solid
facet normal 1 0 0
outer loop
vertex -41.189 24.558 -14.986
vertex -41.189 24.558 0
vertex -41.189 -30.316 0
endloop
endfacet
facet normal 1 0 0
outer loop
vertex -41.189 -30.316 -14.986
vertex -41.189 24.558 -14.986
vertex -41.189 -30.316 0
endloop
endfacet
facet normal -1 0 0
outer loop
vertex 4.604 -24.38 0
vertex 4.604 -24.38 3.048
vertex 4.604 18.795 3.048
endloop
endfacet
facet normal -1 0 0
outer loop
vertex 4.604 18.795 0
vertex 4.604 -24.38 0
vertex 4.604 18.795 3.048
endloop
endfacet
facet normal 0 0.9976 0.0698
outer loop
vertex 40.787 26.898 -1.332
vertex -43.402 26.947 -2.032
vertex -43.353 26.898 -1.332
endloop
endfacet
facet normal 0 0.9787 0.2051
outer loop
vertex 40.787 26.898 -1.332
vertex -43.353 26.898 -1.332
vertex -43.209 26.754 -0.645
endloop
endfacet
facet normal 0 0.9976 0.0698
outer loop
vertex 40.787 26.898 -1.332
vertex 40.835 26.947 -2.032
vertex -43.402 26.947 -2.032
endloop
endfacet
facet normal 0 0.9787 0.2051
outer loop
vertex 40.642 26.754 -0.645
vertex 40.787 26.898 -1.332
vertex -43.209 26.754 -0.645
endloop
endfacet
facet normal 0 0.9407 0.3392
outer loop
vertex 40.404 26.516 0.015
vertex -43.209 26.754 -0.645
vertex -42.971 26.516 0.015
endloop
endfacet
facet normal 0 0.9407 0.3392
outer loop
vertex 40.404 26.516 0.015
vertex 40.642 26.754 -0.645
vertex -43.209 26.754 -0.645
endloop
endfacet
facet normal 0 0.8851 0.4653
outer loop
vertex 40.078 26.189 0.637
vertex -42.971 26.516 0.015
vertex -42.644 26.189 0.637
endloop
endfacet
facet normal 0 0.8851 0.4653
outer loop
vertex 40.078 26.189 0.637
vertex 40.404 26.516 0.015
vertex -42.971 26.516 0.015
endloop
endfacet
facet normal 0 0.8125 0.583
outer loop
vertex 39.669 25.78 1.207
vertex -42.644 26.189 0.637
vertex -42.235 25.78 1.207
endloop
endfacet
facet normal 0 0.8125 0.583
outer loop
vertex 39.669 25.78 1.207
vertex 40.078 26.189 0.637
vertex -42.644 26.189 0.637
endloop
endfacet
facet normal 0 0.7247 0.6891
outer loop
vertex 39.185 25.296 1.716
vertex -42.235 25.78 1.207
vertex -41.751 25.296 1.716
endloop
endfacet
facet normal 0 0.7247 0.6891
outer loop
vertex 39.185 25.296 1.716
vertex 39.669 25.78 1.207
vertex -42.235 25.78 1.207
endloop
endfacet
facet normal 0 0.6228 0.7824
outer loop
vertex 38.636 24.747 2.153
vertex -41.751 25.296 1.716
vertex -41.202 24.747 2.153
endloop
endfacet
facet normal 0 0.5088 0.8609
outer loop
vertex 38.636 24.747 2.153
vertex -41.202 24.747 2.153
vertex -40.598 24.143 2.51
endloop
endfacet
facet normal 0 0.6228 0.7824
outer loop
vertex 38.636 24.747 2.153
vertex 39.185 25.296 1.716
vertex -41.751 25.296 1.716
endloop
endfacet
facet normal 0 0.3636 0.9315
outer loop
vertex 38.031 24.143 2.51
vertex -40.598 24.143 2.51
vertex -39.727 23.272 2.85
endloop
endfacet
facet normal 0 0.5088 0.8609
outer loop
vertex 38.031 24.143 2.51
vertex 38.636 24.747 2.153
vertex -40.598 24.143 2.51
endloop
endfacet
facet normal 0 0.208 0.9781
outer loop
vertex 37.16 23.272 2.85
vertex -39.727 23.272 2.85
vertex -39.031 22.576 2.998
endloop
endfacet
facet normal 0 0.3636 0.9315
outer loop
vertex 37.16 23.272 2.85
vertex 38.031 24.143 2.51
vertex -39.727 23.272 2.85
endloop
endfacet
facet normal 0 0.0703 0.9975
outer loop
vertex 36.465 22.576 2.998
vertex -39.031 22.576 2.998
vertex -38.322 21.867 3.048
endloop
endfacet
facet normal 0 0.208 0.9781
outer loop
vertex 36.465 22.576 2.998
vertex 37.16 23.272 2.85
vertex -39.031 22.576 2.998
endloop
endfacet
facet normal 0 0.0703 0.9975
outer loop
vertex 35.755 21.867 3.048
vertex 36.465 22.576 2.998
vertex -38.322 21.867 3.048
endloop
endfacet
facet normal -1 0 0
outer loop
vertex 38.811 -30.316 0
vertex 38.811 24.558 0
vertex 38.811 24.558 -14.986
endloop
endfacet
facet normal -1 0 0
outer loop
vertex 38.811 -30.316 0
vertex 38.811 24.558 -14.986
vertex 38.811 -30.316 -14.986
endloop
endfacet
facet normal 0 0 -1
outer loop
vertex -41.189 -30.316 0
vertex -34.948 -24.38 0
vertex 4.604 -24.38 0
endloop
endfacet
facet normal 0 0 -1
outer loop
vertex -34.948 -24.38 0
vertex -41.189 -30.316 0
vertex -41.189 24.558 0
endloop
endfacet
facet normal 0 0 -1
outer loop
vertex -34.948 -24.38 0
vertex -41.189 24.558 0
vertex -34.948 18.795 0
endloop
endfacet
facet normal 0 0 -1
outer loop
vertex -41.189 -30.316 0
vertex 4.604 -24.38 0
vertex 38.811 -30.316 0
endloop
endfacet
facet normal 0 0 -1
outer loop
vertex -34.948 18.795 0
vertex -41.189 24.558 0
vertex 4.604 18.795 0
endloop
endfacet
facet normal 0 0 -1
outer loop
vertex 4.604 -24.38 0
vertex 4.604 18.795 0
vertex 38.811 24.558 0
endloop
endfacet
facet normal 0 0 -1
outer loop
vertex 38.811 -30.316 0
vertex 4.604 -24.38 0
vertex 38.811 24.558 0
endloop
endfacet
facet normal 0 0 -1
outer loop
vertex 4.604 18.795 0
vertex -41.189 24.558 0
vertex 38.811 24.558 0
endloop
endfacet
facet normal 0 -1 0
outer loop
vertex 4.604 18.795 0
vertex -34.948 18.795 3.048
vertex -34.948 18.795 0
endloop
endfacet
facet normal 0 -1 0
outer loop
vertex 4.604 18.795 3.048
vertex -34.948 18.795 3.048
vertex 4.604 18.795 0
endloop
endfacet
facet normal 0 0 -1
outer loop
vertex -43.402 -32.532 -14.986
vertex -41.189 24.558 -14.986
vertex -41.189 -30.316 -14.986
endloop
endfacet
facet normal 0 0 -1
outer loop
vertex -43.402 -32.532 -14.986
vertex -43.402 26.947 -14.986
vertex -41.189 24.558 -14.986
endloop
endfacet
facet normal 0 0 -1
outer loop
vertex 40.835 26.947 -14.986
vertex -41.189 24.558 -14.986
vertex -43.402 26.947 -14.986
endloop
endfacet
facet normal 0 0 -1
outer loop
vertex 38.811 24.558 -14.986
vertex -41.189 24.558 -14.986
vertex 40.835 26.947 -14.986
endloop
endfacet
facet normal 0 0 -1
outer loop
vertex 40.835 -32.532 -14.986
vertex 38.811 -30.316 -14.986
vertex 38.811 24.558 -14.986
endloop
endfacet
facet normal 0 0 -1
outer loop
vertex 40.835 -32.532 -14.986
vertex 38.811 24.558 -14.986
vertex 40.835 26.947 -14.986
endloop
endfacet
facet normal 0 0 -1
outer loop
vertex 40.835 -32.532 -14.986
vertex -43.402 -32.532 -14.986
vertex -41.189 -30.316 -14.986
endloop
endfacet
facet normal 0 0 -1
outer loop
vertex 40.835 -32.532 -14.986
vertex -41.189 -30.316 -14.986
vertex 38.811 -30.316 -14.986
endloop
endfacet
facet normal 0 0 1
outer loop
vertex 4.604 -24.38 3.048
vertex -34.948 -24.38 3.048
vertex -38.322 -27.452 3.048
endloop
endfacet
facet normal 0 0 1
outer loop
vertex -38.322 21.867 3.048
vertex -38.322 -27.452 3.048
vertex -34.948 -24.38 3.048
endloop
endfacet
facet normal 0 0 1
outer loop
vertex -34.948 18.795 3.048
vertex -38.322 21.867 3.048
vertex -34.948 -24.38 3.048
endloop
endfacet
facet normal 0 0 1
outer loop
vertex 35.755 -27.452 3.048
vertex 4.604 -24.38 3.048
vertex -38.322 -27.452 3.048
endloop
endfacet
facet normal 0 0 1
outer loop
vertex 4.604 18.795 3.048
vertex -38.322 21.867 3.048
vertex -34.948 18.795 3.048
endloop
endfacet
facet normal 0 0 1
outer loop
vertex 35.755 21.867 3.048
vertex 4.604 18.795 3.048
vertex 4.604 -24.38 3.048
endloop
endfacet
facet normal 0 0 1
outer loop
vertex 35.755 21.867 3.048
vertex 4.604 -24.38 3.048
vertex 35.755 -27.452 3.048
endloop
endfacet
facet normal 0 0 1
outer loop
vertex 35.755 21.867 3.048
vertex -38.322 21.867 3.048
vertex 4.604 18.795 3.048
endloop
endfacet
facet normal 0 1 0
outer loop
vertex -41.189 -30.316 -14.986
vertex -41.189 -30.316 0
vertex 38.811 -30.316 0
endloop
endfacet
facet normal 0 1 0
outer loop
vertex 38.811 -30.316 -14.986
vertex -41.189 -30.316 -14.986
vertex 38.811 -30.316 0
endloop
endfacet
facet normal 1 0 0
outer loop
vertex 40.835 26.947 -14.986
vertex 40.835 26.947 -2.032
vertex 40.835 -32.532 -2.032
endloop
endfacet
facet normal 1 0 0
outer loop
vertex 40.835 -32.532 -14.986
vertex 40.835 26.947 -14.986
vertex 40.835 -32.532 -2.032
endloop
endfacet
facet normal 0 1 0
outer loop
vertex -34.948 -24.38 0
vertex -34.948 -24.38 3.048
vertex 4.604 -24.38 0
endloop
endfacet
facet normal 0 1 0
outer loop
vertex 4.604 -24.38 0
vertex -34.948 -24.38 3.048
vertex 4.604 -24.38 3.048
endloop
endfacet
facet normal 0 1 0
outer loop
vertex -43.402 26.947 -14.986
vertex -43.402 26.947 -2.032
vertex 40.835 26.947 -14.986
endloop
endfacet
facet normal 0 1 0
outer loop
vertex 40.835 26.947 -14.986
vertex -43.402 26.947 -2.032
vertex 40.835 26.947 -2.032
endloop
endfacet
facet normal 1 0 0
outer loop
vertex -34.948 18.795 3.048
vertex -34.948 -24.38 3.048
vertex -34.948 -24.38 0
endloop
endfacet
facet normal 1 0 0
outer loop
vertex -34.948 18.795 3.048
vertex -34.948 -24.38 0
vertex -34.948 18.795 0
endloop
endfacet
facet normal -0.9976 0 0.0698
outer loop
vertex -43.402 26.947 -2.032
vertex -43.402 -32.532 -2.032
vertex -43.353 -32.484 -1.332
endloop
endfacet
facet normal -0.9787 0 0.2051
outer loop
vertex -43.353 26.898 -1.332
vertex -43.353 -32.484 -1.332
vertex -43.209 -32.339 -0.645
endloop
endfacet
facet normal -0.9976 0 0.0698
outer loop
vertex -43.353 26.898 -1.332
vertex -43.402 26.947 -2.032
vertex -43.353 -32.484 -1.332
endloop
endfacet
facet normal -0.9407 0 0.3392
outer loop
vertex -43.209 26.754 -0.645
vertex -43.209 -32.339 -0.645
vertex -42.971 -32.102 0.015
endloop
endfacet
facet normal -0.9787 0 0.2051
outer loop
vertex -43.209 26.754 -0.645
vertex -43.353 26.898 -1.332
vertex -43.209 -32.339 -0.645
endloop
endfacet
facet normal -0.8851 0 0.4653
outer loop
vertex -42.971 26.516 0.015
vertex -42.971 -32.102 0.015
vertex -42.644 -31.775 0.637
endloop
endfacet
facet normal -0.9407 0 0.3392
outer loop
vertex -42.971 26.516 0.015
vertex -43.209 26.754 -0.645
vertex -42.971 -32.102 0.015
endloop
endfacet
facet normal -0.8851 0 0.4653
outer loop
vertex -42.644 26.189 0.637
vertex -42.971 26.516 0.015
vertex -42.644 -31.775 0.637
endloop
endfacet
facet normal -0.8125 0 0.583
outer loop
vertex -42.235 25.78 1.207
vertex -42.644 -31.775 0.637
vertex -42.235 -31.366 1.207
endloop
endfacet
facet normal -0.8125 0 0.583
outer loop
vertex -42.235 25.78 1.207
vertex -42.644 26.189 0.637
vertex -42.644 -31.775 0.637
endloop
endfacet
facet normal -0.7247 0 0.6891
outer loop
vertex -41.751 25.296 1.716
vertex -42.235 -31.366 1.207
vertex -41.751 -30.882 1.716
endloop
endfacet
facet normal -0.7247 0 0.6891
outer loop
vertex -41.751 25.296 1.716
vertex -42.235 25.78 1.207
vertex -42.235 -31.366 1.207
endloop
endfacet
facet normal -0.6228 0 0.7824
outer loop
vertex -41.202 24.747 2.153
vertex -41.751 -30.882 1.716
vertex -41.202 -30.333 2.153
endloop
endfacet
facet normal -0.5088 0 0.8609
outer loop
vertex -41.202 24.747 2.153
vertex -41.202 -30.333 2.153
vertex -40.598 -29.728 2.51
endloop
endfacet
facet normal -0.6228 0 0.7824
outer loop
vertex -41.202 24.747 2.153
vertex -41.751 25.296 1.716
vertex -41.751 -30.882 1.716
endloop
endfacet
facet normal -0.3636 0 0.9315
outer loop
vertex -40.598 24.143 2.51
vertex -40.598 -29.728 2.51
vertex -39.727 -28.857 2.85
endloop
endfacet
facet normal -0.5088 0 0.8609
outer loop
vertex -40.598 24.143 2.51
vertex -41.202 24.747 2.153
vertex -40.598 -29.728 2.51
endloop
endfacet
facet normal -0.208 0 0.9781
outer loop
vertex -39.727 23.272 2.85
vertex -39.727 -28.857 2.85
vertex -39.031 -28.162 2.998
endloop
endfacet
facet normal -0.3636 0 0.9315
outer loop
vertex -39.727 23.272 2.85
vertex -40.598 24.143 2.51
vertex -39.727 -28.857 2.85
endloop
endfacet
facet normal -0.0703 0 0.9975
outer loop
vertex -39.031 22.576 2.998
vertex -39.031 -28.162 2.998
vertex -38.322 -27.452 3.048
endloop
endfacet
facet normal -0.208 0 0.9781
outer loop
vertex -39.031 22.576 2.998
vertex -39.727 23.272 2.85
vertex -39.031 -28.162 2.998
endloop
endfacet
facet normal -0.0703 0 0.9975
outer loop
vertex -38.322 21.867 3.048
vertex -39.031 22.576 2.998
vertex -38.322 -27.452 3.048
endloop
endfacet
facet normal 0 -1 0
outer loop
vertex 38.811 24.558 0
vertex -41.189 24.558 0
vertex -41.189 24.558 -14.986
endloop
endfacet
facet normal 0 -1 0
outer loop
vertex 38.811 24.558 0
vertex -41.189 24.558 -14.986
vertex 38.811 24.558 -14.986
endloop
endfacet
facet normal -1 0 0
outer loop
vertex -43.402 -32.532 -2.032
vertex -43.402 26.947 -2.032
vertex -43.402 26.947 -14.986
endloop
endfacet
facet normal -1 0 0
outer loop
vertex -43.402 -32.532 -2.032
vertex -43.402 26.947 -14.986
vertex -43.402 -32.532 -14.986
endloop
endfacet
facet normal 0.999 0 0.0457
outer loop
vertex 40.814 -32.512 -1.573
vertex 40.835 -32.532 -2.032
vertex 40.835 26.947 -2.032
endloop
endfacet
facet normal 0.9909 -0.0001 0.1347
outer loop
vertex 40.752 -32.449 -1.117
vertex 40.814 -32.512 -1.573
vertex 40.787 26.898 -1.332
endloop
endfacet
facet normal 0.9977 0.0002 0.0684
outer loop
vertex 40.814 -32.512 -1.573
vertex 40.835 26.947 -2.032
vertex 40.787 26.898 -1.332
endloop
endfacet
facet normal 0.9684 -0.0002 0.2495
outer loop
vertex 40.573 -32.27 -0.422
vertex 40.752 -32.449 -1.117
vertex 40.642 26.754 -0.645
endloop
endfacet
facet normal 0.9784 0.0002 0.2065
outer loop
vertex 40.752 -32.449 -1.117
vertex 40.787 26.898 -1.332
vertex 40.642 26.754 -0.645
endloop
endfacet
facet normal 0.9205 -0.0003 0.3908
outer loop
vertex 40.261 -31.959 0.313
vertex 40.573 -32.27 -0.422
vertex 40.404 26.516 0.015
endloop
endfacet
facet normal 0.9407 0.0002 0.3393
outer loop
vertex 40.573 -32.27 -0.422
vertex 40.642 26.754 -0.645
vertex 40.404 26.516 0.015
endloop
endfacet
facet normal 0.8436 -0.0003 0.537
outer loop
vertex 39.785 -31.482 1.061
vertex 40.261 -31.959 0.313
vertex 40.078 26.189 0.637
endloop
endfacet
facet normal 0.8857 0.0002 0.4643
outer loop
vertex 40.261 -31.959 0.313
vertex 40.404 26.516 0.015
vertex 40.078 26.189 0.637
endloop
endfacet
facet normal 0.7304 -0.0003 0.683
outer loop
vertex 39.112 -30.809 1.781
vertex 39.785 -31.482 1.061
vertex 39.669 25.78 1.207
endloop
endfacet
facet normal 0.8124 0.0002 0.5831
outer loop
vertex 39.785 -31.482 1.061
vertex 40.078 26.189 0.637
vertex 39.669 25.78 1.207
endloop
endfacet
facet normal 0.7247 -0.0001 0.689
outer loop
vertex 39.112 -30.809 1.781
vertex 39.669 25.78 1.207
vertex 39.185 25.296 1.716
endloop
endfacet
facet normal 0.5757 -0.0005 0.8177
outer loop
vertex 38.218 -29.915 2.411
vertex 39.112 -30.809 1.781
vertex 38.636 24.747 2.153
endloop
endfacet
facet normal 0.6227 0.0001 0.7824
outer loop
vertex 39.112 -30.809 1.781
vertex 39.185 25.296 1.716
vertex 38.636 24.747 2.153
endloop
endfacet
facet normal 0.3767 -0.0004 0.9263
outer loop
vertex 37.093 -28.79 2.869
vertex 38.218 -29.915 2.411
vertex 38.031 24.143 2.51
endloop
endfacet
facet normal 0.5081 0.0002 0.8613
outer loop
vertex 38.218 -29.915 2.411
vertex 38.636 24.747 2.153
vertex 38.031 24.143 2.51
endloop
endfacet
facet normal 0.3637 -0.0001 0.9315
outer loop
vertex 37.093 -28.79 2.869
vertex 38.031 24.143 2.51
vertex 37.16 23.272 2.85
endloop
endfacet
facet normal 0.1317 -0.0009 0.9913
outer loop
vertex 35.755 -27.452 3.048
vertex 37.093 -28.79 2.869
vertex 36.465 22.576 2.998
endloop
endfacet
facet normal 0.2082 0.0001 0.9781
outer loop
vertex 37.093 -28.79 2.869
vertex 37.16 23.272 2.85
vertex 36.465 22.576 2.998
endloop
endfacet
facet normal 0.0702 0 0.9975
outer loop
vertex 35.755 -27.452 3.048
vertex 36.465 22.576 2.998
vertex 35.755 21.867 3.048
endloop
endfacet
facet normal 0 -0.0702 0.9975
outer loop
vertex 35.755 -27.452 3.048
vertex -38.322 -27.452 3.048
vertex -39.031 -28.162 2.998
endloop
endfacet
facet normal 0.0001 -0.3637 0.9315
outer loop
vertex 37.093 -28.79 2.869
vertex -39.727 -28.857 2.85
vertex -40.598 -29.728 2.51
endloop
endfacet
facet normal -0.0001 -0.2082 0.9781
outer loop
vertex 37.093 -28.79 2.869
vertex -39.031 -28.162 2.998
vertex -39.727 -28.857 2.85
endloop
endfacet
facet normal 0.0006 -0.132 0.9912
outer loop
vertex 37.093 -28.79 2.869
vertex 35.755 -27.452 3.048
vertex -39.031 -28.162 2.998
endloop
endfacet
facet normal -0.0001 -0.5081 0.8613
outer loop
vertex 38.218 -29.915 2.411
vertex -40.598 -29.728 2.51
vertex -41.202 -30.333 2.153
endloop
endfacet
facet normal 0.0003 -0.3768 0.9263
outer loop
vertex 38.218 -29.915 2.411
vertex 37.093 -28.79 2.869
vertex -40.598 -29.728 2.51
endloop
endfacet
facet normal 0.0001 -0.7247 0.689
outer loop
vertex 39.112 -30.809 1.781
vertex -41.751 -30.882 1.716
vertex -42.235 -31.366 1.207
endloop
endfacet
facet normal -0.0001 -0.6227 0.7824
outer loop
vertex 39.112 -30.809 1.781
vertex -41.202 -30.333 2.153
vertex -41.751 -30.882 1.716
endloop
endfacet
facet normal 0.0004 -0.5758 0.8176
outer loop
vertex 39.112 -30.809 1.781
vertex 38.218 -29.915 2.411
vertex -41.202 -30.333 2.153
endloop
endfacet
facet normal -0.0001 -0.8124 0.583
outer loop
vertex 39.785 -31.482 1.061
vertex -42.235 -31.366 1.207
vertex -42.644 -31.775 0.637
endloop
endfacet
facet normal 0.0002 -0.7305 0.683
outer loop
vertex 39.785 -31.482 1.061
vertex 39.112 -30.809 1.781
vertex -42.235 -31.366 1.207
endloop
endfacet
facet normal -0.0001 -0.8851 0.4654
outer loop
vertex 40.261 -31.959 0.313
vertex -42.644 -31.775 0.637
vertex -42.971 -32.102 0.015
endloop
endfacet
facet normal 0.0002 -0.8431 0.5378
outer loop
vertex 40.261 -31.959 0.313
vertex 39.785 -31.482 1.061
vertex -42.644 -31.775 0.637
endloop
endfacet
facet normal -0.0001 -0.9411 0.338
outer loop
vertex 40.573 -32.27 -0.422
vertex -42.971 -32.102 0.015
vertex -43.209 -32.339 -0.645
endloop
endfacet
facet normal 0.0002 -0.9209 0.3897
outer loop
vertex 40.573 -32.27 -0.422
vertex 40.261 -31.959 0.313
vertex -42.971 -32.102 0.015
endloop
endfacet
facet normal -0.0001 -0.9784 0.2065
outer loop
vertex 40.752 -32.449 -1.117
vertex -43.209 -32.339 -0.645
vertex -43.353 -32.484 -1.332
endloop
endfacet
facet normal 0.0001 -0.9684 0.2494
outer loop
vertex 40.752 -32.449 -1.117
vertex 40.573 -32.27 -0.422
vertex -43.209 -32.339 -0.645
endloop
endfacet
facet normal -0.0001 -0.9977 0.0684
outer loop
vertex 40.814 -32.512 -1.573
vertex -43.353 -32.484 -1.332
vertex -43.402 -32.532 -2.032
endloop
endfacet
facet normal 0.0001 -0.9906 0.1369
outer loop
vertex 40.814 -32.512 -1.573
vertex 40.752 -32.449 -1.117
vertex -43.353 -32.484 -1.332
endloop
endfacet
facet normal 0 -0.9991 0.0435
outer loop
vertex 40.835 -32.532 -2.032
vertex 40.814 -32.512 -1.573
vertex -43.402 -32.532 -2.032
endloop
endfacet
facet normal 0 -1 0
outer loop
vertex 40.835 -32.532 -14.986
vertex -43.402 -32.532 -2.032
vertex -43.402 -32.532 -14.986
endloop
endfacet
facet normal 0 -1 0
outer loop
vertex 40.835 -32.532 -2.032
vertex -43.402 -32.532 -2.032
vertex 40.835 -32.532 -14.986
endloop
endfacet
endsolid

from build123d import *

# Parameters (mm, degrees)
F0_W     = 84.236942
F0_H     = 59.479135
F1_DEPTH = 3.048
F2_W     = 84.236942
F2_H     = 59.479135
F2_W_2   = 79.999916
F2_H_2   = 54.874644
F3_DEPTH = 14.986
F4_R     = 5.08
F5_W     = 39.552113
F5_H     = 43.175208
F6_DEPTH = 25.4


with BuildPart() as f1:
    # F0 (on Top) → F1 (new body)
    with BuildSketch(Plane.XY):
        with Locations((-1.28318, -2.792804)):
            Rectangle(F0_W, F0_H)
    extrude(amount=F1_DEPTH)

    # F2 (on face) → F3 (join)
    with BuildSketch(Plane(origin=(0, 0, 0), x_dir=(1, 0, 0), z_dir=(0, 0, -1))):
        with Locations((-1.28318, 2.792804)):
            Rectangle(F2_W, F2_H)
        with Locations((-1.188636, 2.879139)):
            Rectangle(F2_W_2, F2_H_2, mode=Mode.SUBTRACT)
    extrude(amount=F3_DEPTH)

    # F4
    f4_edges = [f1.edges().sort_by_distance(p)[0] for p in [
        (-43.401651, -2.792805, 3.048),
        (-1.28318, -32.532372, 3.048),
        (40.835291, -2.792805, 3.048),
        (-1.28318, 26.946763, 3.048),
    ]]
    fillet(f4_edges, radius=F4_R)

    # F5 (on face) → F6 (cut)
    with BuildSketch(Plane.XY.offset(3.048)):
        with Locations((-15.171708, -2.792801)):
            Rectangle(F5_W, F5_H)
    extrude(amount=-F6_DEPTH, mode=Mode.SUBTRACT)


solid = f1.part
